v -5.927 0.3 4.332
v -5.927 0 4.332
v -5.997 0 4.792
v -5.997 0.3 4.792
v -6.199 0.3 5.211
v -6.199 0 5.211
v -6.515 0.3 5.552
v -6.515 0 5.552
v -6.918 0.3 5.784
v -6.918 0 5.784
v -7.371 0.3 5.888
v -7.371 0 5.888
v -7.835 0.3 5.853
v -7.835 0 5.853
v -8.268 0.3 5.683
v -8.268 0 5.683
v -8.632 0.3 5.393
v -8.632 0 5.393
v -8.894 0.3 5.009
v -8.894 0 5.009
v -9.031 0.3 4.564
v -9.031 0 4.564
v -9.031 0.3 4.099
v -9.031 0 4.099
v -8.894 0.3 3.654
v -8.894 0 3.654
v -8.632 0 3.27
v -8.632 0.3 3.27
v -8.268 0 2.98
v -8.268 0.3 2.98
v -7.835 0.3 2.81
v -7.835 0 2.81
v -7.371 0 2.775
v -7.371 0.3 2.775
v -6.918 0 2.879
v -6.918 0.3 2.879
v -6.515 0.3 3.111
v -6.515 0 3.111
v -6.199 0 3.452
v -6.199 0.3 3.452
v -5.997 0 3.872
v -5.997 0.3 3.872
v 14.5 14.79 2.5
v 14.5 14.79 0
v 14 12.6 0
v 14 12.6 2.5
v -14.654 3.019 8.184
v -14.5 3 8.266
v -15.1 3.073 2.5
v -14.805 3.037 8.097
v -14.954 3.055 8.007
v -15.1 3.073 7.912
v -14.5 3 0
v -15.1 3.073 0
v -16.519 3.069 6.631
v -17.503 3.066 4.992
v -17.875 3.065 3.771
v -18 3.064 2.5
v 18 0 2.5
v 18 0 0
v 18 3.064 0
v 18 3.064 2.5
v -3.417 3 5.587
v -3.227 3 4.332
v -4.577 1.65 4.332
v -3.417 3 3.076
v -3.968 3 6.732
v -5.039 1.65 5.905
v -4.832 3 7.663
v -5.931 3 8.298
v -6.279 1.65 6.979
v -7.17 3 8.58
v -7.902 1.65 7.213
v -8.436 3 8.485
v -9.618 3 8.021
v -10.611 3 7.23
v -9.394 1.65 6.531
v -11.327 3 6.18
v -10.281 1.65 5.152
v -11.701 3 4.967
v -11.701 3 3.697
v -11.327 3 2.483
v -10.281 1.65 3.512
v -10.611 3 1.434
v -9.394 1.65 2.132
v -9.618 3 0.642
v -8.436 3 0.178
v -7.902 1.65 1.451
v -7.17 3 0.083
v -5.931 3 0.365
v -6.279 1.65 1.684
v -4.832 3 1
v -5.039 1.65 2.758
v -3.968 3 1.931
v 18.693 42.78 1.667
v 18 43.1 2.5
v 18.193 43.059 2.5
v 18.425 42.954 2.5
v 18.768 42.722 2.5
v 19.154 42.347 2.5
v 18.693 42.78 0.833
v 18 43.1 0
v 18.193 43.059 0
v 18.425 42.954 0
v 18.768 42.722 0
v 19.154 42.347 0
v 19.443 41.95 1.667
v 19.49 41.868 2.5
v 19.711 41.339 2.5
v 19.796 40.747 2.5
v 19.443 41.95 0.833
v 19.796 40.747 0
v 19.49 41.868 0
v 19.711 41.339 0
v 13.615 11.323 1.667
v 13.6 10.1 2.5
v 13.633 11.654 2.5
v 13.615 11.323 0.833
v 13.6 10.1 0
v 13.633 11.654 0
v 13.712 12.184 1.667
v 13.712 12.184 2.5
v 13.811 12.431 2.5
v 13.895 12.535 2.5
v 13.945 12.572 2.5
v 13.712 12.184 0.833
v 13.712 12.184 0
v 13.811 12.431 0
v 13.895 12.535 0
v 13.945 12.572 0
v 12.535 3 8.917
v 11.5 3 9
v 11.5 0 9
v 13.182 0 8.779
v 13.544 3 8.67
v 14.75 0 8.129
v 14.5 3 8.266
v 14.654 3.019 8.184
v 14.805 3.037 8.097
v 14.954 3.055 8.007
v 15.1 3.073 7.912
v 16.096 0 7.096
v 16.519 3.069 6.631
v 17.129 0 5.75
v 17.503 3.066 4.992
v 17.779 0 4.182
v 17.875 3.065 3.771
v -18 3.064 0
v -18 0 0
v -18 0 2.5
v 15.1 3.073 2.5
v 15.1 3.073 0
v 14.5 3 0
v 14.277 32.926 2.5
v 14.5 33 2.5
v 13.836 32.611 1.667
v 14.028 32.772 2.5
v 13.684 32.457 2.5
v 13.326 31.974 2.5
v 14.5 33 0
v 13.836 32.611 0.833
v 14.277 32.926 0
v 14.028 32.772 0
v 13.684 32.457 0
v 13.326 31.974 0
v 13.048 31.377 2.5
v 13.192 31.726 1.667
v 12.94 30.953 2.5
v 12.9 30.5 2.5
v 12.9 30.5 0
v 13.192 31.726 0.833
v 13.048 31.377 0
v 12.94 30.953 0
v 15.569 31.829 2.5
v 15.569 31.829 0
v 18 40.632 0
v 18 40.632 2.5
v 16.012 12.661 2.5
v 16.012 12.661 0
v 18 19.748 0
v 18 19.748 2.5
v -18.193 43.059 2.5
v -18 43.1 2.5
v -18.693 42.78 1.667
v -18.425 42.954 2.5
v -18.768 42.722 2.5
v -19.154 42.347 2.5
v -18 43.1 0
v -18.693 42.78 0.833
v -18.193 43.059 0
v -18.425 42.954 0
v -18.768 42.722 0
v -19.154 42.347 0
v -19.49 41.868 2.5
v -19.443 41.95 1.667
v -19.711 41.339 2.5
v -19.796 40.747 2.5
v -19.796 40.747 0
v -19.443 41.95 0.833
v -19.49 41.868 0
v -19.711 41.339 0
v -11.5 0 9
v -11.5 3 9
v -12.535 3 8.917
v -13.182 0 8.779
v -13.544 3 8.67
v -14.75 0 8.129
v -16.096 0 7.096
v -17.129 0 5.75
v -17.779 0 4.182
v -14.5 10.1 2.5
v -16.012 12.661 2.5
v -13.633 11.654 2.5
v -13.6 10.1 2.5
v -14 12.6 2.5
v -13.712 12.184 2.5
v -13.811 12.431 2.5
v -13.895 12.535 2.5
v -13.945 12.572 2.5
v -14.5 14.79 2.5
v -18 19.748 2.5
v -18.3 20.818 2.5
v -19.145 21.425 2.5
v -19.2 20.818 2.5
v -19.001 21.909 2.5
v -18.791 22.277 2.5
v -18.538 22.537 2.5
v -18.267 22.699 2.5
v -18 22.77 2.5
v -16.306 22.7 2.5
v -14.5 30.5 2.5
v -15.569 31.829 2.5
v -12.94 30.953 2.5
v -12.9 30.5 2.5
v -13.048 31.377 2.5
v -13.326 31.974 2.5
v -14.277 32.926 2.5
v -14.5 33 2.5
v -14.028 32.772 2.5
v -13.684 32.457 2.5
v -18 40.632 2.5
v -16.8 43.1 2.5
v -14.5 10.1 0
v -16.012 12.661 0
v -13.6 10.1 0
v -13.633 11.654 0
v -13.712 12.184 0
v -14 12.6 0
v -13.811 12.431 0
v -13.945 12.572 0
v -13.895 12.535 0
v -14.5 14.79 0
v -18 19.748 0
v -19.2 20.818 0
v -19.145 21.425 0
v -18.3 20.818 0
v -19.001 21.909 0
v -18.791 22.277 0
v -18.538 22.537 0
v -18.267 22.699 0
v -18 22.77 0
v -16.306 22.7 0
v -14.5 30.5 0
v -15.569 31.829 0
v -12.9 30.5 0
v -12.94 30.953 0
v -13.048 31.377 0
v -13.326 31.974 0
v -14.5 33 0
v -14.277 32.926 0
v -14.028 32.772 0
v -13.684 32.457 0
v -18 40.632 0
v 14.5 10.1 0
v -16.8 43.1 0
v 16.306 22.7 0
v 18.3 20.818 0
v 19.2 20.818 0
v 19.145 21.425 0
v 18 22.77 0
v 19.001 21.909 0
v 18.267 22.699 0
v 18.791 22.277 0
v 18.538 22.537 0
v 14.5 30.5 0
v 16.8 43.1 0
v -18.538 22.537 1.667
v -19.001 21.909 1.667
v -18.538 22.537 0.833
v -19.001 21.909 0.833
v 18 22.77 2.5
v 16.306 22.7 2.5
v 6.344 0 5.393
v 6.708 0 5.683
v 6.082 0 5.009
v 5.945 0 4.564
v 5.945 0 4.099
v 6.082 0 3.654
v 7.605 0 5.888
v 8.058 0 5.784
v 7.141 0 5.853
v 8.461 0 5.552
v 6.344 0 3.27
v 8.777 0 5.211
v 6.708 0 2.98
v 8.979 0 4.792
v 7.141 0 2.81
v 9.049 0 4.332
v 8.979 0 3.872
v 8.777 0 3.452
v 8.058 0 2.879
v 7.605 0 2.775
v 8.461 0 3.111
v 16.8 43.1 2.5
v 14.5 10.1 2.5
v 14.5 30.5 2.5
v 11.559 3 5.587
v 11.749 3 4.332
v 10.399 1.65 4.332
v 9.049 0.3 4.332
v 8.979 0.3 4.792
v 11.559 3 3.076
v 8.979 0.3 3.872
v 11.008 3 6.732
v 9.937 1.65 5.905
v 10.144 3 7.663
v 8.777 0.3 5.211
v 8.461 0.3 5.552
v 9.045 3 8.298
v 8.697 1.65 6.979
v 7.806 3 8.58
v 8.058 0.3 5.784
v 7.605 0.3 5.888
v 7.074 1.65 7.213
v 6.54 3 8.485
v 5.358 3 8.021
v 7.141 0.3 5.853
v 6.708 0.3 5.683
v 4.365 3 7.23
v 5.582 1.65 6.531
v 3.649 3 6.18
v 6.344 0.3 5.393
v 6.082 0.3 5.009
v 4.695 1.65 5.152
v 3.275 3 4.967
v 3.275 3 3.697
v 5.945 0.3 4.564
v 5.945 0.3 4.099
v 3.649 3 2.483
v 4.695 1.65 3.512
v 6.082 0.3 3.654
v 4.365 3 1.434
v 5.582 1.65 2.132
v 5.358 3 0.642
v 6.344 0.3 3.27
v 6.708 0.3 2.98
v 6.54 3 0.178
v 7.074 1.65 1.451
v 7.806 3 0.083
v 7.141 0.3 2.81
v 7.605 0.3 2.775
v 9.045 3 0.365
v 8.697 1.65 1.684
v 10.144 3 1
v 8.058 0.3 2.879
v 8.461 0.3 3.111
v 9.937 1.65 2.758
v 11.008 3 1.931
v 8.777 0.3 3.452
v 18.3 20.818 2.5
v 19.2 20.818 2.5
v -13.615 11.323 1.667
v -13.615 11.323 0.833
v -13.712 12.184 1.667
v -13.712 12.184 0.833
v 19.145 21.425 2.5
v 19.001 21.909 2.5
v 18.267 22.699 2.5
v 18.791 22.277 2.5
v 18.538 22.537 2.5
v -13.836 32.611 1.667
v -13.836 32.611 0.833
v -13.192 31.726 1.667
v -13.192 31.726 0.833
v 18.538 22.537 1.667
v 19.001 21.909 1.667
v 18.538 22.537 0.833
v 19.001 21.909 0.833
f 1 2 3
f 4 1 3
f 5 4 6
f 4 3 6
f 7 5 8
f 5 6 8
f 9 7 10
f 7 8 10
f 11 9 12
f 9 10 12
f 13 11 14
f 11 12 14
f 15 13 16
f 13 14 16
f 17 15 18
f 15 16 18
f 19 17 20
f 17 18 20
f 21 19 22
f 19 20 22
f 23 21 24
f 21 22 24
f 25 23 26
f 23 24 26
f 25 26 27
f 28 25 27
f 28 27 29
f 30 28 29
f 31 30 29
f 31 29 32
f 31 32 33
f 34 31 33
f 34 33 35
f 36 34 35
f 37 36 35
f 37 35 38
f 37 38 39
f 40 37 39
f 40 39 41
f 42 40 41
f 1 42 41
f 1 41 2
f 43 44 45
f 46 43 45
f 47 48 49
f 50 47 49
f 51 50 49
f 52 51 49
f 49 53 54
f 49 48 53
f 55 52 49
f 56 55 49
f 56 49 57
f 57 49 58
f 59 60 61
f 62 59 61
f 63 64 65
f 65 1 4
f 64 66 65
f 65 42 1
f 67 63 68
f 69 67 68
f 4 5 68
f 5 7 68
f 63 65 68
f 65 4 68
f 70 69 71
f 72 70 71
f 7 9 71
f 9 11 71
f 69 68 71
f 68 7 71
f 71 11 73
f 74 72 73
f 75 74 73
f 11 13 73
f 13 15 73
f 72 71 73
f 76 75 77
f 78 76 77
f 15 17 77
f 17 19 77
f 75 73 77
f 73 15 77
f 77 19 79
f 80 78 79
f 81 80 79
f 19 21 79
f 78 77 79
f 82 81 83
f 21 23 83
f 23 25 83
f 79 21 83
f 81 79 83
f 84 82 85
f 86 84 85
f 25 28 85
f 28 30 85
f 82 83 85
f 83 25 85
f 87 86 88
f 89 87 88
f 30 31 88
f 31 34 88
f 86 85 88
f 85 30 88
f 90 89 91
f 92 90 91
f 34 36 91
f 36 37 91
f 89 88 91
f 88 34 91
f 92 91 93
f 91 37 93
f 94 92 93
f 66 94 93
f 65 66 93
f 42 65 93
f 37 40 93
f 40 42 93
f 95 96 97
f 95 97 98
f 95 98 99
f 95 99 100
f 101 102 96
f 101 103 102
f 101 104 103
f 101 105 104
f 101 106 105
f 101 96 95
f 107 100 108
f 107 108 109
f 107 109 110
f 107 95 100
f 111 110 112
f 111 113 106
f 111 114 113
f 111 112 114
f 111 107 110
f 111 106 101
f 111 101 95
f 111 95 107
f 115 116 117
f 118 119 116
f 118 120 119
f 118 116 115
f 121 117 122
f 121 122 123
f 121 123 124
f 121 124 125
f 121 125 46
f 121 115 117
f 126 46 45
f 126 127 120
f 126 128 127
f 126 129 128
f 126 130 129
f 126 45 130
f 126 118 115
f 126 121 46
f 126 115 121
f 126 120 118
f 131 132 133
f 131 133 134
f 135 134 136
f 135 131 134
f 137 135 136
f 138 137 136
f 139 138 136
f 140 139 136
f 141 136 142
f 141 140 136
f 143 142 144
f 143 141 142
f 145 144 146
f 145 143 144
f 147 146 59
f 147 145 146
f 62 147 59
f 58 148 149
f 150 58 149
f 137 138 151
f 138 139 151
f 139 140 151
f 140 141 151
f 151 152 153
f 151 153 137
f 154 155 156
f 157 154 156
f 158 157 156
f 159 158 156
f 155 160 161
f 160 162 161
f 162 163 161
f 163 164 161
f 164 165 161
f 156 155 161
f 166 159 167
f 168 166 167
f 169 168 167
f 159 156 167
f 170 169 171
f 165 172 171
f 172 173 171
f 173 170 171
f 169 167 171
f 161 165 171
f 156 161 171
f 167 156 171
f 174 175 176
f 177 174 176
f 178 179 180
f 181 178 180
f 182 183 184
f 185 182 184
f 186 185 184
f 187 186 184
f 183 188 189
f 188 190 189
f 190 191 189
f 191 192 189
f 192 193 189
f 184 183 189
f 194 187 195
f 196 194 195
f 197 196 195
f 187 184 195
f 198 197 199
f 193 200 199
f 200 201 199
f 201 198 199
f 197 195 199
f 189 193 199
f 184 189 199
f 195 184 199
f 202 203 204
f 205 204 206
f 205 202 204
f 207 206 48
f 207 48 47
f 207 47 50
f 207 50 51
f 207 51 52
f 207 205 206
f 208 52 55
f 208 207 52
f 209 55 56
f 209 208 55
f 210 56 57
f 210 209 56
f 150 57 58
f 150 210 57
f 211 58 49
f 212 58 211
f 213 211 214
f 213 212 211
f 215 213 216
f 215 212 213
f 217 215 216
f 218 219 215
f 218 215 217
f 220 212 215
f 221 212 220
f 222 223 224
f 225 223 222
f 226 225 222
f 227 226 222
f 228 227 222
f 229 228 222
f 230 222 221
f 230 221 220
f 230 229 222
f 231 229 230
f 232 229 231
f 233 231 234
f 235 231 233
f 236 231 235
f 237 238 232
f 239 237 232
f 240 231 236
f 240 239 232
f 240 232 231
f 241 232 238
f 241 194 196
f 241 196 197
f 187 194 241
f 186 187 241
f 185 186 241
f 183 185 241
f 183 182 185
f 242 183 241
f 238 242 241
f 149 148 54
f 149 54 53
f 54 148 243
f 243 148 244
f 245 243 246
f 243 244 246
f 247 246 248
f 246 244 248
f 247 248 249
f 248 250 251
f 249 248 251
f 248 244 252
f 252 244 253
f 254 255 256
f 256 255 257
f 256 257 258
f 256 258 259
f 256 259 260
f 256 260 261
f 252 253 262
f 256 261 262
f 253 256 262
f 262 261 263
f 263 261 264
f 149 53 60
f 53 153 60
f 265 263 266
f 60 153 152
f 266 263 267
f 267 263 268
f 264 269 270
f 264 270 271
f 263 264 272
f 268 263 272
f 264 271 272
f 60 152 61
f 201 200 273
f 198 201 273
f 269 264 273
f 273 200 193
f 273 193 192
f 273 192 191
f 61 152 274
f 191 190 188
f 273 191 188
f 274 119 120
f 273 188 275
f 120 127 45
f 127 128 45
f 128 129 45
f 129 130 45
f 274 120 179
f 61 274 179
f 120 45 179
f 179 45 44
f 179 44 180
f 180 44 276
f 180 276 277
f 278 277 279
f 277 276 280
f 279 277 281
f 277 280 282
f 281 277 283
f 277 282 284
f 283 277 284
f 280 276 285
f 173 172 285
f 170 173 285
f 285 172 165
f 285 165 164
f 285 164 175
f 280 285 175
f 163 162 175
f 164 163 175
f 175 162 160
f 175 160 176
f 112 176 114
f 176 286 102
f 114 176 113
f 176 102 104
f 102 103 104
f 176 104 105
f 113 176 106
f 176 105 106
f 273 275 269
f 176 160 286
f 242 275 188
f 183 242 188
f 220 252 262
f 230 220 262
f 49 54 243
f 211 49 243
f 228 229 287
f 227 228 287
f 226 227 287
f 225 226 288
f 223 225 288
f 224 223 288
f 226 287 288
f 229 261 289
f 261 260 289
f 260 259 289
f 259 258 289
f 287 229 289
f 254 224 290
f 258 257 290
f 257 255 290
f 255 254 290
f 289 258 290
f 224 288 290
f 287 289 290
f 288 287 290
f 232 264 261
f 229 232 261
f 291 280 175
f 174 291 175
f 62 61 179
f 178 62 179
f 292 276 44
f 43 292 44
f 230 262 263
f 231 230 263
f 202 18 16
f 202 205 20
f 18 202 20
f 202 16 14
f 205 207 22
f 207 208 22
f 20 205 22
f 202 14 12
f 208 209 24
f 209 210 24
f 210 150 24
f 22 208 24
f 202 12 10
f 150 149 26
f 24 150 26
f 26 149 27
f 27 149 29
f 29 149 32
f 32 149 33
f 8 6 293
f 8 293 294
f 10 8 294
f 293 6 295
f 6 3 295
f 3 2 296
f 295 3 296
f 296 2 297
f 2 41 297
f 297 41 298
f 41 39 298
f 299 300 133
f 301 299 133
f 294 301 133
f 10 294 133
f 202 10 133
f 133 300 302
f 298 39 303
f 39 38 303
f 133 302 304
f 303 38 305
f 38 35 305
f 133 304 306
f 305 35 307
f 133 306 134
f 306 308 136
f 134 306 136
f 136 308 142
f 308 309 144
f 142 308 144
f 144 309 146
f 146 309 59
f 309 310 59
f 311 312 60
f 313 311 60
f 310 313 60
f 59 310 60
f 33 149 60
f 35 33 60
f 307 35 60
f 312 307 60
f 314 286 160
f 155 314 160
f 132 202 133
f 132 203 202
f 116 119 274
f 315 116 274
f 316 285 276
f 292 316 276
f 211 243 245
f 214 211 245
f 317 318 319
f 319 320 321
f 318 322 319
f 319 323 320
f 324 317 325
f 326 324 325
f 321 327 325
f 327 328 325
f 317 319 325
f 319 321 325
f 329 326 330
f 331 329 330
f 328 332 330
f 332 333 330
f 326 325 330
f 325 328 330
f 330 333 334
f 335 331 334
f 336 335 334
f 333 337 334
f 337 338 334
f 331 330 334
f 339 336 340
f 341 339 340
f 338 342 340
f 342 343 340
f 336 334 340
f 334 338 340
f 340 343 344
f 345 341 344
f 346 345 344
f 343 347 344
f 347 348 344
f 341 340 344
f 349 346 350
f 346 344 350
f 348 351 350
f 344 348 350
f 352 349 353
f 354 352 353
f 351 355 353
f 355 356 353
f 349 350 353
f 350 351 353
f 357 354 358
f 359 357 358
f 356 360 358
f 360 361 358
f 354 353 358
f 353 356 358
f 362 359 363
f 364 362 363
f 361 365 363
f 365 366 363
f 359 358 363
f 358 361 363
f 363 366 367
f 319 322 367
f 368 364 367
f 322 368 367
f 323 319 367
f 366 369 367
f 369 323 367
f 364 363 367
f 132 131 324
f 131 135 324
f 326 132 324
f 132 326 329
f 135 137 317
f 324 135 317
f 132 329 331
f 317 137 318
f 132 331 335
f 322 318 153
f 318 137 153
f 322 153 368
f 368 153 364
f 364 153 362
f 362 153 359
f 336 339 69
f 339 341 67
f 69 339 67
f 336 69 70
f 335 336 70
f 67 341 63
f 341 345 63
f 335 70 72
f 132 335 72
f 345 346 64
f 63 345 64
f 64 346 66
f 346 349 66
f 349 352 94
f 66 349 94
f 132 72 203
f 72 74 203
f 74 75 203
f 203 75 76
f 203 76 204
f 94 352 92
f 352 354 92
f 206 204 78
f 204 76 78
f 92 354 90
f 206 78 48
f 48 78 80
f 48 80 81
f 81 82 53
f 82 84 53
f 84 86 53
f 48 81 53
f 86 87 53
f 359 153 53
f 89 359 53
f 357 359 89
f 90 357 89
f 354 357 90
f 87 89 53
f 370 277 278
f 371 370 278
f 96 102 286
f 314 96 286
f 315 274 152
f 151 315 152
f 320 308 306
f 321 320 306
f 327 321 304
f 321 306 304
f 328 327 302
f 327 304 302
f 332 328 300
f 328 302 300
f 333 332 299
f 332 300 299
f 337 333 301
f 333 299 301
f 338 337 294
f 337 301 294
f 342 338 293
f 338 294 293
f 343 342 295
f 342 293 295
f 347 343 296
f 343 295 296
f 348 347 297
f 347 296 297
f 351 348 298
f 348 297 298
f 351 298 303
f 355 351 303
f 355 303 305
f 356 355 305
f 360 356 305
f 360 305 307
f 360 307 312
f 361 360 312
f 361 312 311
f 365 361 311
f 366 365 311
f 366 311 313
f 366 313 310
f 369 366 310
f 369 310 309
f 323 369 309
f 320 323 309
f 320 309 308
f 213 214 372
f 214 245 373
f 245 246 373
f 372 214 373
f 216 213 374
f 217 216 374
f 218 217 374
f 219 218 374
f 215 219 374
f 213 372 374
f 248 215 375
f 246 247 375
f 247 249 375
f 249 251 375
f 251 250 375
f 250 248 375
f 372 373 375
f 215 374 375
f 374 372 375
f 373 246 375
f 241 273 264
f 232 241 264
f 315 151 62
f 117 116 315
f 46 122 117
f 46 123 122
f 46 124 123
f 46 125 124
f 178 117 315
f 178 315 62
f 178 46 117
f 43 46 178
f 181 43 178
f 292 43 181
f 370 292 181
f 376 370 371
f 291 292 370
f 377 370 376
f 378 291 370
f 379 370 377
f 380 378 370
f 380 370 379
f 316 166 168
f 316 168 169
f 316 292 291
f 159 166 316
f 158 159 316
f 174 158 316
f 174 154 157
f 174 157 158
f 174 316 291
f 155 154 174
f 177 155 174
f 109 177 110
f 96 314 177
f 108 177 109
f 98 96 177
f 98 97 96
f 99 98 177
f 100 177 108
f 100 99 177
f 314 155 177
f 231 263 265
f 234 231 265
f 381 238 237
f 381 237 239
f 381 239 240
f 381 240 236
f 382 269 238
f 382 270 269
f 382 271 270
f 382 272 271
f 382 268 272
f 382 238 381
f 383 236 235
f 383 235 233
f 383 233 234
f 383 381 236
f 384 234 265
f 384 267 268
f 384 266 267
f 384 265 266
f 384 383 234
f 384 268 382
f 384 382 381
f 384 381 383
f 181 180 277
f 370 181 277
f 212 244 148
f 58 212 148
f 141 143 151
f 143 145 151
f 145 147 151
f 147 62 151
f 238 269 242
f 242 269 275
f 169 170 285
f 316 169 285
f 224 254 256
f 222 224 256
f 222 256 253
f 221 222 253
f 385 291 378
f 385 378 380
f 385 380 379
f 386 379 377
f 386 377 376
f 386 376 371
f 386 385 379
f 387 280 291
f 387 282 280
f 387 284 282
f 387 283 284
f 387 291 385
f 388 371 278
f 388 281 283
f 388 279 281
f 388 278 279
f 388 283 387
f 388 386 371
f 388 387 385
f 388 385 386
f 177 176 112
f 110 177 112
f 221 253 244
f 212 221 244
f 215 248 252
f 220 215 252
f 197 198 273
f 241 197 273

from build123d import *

# Parameters (mm, degrees)
F0_W     = 14.5
F0_H     = 3
F1_DEPTH = 2.5
F2_DEPTH = 9
F3_R     = 1.5606676117
F4_DEPTH = 25
F5_SIZE  = 2.7
F6_R     = 6.5


with BuildPart() as f1:
    # F0 (on Top) → F1 (new body)
    with BuildSketch(Plane.XY):
        Polygon((-15.1000638381, 3.0731637962), (-14.5, 10.1), (-14.5, 14.7897112858), (-16.3062401116, 22.7), (-14.5, 30.5), (-14.5, 33), (-16.8, 43.1), (-18, 43.1), (-18, 40.6315773726), (-15.569419682, 31.8290367723), (-18, 22.7700328082), (-18, 19.7484236718), (-16.0118928999, 12.6614226028), (-18, 3.0642349739), align=None)
        with Locations((-7.25, 1.5)):
            Rectangle(F0_W, F0_H)
        Polygon((-18, 0), (-14.5, 0), (-14.5, 3), (-15.1000638381, 3.0731637962), (-18, 3.0642349739), align=None)
        with Locations((7.25, 1.5)):
            Rectangle(F0_W, F0_H)
        Polygon((14.5, 3), (14.5, 0), (18, 0), (18, 3.0642349739), (15.1000638381, 3.0731637962), align=None)
        Polygon((14.5, 14.7897112858), (14.5, 10.1), (15.1000638381, 3.0731637962), (18, 3.0642349739), (16.0118928999, 12.6614226028), (18, 19.7484236718), (18, 22.7700328082), (15.569419682, 31.8290367723), (18, 40.6315773726), (18, 43.1), (16.8, 43.1), (14.5, 33), (14.5, 30.5), (16.3062401116, 22.7), align=None)
        with BuildLine():
            Line((13.6, 10.1), (14.5, 10.1))
            Line((14.5, 10.1), (14.5, 14.7897112858))
            Line((14.5, 14.7897112858), (14, 12.6))
            add(Edge.make_bspline(
                [(13.6, 10.1), (13.6104541942, 11.4760398865), (13.5792037472, 12.4339209869), (14, 12.6)],
                knots=[0, 0, 0, 0, 2.5317977802, 2.5317977802, 2.5317977802, 2.5317977802], degree=3))
        make_face()
        with BuildLine():
            Line((-14.5, 14.7897112858), (-14.5, 10.1))
            Line((-14.5, 10.1), (-13.6, 10.1))
            add(Edge.make_bspline(
                [(-13.6, 10.1), (-13.6104541942, 11.4760398865), (-13.5792037472, 12.4339209869), (-14, 12.6)],
                knots=[0, 0, 0, 0, 2.5317977802, 2.5317977802, 2.5317977802, 2.5317977802], degree=3))
            Line((-14, 12.6), (-14.5, 14.7897112858))
        make_face()
        with BuildLine():
            Line((18, 22.7700328082), (18, 19.7484236718))
            Line((18, 19.7484236718), (18.3, 20.8178330213))
            Line((18.3, 20.8178330213), (19.2, 20.8178330213))
            add(Edge.make_bspline(
                [(18, 22.7700328082), (18.5130968392, 22.7131574929), (19.1960260391, 22.1627136484), (19.2, 20.8178330213)],
                knots=[0, 0, 0, 0, 2.2915243852, 2.2915243852, 2.2915243852, 2.2915243852], degree=3))
        make_face()
        with BuildLine():
            Line((-18.3, 20.8178330213), (-18, 19.7484236718))
            Line((-18, 19.7484236718), (-18, 22.7700328082))
            add(Edge.make_bspline(
                [(-18, 22.7700328082), (-18.5130968392, 22.7131574929), (-19.1960260391, 22.1627136484), (-19.2, 20.8178330213)],
                knots=[0, 0, 0, 0, 2.2915243852, 2.2915243852, 2.2915243852, 2.2915243852], degree=3))
            Line((-19.2, 20.8178330213), (-18.3, 20.8178330213))
        make_face()
        with BuildLine():
            Line((12.9, 30.5), (14.5, 30.5))
            Line((14.5, 30.5), (14.5, 33))
            add(Edge.make_bspline(
                [(14.5, 33), (13.9373009205, 32.9109020531), (12.9039739609, 31.8448806271), (12.9, 30.5)],
                knots=[0, 0, 0, 0, 2.9681644159, 2.9681644159, 2.9681644159, 2.9681644159], degree=3))
        make_face()
        with BuildLine():
            Line((-14.5, 33), (-14.5, 30.5))
            Line((-14.5, 30.5), (-12.9, 30.5))
            add(Edge.make_bspline(
                [(-14.5, 33), (-13.9373009205, 32.9109020531), (-12.9039739609, 31.8448806271), (-12.9, 30.5)],
                knots=[0, 0, 0, 0, 2.9681644159, 2.9681644159, 2.9681644159, 2.9681644159], degree=3))
        make_face()
        with BuildLine():
            Line((-19.7963143, 40.7467074541), (-18, 40.6315773726))
            Line((-18, 40.6315773726), (-18, 43.1))
            add(Edge.make_bspline(
                [(-18, 43.1), (-18.5130959079, 43.0794730783), (-19.7923403391, 42.0915880812), (-19.7963143, 40.7467074541)],
                knots=[0, 0, 0, 0, 2.9605288161, 2.9605288161, 2.9605288161, 2.9605288161], degree=3))
        make_face()
        with BuildLine():
            Line((18, 43.1), (18, 40.6315773726))
            Line((18, 40.6315773726), (19.7963143, 40.7467074541))
            add(Edge.make_bspline(
                [(18, 43.1), (18.5130959079, 43.0794730783), (19.7923403391, 42.0915880812), (19.7963143, 40.7467074541)],
                knots=[0, 0, 0, 0, 2.9605288161, 2.9605288161, 2.9605288161, 2.9605288161], degree=3))
        make_face()
    extrude(amount=F1_DEPTH)

    # F0 (on Top) → F2 (join)
    with BuildSketch(Plane.XY):
        Polygon((-18, 0), (-14.5, 0), (-14.5, 3), (-15.1000638381, 3.0731637962), (-18, 3.0642349739), align=None)
        with Locations((-7.25, 1.5)):
            Rectangle(F0_W, F0_H)
        with Locations((7.25, 1.5)):
            Rectangle(F0_W, F0_H)
        Polygon((14.5, 3), (14.5, 0), (18, 0), (18, 3.0642349739), (15.1000638381, 3.0731637962), align=None)
    extrude(amount=F2_DEPTH)

    # F3 (on Front) → F4 (cut)
    with BuildSketch(Plane.XZ):
        with Locations((7.4880118482, 4.3315729126)):
            Circle(F3_R)
        with Locations((-7.4880118482, 4.3315729126)):
            Circle(F3_R)
    extrude(amount=-F4_DEPTH, mode=Mode.SUBTRACT)

    # F5
    f5_edges = [f1.edges().sort_by_distance(p)[0] for p in [
        (5.927344, 3, 4.331573),
        (-9.048679, 3, 4.331573),
    ]]
    chamfer(f5_edges, length=F5_SIZE)

    # F6
    f6_edges = [f1.edges().sort_by_distance(p)[0] for p in [
        (-18, 1.532117, 9),
        (18, 1.532117, 9),
    ]]
    fillet(f6_edges, radius=F6_R)


solid = f1.part
